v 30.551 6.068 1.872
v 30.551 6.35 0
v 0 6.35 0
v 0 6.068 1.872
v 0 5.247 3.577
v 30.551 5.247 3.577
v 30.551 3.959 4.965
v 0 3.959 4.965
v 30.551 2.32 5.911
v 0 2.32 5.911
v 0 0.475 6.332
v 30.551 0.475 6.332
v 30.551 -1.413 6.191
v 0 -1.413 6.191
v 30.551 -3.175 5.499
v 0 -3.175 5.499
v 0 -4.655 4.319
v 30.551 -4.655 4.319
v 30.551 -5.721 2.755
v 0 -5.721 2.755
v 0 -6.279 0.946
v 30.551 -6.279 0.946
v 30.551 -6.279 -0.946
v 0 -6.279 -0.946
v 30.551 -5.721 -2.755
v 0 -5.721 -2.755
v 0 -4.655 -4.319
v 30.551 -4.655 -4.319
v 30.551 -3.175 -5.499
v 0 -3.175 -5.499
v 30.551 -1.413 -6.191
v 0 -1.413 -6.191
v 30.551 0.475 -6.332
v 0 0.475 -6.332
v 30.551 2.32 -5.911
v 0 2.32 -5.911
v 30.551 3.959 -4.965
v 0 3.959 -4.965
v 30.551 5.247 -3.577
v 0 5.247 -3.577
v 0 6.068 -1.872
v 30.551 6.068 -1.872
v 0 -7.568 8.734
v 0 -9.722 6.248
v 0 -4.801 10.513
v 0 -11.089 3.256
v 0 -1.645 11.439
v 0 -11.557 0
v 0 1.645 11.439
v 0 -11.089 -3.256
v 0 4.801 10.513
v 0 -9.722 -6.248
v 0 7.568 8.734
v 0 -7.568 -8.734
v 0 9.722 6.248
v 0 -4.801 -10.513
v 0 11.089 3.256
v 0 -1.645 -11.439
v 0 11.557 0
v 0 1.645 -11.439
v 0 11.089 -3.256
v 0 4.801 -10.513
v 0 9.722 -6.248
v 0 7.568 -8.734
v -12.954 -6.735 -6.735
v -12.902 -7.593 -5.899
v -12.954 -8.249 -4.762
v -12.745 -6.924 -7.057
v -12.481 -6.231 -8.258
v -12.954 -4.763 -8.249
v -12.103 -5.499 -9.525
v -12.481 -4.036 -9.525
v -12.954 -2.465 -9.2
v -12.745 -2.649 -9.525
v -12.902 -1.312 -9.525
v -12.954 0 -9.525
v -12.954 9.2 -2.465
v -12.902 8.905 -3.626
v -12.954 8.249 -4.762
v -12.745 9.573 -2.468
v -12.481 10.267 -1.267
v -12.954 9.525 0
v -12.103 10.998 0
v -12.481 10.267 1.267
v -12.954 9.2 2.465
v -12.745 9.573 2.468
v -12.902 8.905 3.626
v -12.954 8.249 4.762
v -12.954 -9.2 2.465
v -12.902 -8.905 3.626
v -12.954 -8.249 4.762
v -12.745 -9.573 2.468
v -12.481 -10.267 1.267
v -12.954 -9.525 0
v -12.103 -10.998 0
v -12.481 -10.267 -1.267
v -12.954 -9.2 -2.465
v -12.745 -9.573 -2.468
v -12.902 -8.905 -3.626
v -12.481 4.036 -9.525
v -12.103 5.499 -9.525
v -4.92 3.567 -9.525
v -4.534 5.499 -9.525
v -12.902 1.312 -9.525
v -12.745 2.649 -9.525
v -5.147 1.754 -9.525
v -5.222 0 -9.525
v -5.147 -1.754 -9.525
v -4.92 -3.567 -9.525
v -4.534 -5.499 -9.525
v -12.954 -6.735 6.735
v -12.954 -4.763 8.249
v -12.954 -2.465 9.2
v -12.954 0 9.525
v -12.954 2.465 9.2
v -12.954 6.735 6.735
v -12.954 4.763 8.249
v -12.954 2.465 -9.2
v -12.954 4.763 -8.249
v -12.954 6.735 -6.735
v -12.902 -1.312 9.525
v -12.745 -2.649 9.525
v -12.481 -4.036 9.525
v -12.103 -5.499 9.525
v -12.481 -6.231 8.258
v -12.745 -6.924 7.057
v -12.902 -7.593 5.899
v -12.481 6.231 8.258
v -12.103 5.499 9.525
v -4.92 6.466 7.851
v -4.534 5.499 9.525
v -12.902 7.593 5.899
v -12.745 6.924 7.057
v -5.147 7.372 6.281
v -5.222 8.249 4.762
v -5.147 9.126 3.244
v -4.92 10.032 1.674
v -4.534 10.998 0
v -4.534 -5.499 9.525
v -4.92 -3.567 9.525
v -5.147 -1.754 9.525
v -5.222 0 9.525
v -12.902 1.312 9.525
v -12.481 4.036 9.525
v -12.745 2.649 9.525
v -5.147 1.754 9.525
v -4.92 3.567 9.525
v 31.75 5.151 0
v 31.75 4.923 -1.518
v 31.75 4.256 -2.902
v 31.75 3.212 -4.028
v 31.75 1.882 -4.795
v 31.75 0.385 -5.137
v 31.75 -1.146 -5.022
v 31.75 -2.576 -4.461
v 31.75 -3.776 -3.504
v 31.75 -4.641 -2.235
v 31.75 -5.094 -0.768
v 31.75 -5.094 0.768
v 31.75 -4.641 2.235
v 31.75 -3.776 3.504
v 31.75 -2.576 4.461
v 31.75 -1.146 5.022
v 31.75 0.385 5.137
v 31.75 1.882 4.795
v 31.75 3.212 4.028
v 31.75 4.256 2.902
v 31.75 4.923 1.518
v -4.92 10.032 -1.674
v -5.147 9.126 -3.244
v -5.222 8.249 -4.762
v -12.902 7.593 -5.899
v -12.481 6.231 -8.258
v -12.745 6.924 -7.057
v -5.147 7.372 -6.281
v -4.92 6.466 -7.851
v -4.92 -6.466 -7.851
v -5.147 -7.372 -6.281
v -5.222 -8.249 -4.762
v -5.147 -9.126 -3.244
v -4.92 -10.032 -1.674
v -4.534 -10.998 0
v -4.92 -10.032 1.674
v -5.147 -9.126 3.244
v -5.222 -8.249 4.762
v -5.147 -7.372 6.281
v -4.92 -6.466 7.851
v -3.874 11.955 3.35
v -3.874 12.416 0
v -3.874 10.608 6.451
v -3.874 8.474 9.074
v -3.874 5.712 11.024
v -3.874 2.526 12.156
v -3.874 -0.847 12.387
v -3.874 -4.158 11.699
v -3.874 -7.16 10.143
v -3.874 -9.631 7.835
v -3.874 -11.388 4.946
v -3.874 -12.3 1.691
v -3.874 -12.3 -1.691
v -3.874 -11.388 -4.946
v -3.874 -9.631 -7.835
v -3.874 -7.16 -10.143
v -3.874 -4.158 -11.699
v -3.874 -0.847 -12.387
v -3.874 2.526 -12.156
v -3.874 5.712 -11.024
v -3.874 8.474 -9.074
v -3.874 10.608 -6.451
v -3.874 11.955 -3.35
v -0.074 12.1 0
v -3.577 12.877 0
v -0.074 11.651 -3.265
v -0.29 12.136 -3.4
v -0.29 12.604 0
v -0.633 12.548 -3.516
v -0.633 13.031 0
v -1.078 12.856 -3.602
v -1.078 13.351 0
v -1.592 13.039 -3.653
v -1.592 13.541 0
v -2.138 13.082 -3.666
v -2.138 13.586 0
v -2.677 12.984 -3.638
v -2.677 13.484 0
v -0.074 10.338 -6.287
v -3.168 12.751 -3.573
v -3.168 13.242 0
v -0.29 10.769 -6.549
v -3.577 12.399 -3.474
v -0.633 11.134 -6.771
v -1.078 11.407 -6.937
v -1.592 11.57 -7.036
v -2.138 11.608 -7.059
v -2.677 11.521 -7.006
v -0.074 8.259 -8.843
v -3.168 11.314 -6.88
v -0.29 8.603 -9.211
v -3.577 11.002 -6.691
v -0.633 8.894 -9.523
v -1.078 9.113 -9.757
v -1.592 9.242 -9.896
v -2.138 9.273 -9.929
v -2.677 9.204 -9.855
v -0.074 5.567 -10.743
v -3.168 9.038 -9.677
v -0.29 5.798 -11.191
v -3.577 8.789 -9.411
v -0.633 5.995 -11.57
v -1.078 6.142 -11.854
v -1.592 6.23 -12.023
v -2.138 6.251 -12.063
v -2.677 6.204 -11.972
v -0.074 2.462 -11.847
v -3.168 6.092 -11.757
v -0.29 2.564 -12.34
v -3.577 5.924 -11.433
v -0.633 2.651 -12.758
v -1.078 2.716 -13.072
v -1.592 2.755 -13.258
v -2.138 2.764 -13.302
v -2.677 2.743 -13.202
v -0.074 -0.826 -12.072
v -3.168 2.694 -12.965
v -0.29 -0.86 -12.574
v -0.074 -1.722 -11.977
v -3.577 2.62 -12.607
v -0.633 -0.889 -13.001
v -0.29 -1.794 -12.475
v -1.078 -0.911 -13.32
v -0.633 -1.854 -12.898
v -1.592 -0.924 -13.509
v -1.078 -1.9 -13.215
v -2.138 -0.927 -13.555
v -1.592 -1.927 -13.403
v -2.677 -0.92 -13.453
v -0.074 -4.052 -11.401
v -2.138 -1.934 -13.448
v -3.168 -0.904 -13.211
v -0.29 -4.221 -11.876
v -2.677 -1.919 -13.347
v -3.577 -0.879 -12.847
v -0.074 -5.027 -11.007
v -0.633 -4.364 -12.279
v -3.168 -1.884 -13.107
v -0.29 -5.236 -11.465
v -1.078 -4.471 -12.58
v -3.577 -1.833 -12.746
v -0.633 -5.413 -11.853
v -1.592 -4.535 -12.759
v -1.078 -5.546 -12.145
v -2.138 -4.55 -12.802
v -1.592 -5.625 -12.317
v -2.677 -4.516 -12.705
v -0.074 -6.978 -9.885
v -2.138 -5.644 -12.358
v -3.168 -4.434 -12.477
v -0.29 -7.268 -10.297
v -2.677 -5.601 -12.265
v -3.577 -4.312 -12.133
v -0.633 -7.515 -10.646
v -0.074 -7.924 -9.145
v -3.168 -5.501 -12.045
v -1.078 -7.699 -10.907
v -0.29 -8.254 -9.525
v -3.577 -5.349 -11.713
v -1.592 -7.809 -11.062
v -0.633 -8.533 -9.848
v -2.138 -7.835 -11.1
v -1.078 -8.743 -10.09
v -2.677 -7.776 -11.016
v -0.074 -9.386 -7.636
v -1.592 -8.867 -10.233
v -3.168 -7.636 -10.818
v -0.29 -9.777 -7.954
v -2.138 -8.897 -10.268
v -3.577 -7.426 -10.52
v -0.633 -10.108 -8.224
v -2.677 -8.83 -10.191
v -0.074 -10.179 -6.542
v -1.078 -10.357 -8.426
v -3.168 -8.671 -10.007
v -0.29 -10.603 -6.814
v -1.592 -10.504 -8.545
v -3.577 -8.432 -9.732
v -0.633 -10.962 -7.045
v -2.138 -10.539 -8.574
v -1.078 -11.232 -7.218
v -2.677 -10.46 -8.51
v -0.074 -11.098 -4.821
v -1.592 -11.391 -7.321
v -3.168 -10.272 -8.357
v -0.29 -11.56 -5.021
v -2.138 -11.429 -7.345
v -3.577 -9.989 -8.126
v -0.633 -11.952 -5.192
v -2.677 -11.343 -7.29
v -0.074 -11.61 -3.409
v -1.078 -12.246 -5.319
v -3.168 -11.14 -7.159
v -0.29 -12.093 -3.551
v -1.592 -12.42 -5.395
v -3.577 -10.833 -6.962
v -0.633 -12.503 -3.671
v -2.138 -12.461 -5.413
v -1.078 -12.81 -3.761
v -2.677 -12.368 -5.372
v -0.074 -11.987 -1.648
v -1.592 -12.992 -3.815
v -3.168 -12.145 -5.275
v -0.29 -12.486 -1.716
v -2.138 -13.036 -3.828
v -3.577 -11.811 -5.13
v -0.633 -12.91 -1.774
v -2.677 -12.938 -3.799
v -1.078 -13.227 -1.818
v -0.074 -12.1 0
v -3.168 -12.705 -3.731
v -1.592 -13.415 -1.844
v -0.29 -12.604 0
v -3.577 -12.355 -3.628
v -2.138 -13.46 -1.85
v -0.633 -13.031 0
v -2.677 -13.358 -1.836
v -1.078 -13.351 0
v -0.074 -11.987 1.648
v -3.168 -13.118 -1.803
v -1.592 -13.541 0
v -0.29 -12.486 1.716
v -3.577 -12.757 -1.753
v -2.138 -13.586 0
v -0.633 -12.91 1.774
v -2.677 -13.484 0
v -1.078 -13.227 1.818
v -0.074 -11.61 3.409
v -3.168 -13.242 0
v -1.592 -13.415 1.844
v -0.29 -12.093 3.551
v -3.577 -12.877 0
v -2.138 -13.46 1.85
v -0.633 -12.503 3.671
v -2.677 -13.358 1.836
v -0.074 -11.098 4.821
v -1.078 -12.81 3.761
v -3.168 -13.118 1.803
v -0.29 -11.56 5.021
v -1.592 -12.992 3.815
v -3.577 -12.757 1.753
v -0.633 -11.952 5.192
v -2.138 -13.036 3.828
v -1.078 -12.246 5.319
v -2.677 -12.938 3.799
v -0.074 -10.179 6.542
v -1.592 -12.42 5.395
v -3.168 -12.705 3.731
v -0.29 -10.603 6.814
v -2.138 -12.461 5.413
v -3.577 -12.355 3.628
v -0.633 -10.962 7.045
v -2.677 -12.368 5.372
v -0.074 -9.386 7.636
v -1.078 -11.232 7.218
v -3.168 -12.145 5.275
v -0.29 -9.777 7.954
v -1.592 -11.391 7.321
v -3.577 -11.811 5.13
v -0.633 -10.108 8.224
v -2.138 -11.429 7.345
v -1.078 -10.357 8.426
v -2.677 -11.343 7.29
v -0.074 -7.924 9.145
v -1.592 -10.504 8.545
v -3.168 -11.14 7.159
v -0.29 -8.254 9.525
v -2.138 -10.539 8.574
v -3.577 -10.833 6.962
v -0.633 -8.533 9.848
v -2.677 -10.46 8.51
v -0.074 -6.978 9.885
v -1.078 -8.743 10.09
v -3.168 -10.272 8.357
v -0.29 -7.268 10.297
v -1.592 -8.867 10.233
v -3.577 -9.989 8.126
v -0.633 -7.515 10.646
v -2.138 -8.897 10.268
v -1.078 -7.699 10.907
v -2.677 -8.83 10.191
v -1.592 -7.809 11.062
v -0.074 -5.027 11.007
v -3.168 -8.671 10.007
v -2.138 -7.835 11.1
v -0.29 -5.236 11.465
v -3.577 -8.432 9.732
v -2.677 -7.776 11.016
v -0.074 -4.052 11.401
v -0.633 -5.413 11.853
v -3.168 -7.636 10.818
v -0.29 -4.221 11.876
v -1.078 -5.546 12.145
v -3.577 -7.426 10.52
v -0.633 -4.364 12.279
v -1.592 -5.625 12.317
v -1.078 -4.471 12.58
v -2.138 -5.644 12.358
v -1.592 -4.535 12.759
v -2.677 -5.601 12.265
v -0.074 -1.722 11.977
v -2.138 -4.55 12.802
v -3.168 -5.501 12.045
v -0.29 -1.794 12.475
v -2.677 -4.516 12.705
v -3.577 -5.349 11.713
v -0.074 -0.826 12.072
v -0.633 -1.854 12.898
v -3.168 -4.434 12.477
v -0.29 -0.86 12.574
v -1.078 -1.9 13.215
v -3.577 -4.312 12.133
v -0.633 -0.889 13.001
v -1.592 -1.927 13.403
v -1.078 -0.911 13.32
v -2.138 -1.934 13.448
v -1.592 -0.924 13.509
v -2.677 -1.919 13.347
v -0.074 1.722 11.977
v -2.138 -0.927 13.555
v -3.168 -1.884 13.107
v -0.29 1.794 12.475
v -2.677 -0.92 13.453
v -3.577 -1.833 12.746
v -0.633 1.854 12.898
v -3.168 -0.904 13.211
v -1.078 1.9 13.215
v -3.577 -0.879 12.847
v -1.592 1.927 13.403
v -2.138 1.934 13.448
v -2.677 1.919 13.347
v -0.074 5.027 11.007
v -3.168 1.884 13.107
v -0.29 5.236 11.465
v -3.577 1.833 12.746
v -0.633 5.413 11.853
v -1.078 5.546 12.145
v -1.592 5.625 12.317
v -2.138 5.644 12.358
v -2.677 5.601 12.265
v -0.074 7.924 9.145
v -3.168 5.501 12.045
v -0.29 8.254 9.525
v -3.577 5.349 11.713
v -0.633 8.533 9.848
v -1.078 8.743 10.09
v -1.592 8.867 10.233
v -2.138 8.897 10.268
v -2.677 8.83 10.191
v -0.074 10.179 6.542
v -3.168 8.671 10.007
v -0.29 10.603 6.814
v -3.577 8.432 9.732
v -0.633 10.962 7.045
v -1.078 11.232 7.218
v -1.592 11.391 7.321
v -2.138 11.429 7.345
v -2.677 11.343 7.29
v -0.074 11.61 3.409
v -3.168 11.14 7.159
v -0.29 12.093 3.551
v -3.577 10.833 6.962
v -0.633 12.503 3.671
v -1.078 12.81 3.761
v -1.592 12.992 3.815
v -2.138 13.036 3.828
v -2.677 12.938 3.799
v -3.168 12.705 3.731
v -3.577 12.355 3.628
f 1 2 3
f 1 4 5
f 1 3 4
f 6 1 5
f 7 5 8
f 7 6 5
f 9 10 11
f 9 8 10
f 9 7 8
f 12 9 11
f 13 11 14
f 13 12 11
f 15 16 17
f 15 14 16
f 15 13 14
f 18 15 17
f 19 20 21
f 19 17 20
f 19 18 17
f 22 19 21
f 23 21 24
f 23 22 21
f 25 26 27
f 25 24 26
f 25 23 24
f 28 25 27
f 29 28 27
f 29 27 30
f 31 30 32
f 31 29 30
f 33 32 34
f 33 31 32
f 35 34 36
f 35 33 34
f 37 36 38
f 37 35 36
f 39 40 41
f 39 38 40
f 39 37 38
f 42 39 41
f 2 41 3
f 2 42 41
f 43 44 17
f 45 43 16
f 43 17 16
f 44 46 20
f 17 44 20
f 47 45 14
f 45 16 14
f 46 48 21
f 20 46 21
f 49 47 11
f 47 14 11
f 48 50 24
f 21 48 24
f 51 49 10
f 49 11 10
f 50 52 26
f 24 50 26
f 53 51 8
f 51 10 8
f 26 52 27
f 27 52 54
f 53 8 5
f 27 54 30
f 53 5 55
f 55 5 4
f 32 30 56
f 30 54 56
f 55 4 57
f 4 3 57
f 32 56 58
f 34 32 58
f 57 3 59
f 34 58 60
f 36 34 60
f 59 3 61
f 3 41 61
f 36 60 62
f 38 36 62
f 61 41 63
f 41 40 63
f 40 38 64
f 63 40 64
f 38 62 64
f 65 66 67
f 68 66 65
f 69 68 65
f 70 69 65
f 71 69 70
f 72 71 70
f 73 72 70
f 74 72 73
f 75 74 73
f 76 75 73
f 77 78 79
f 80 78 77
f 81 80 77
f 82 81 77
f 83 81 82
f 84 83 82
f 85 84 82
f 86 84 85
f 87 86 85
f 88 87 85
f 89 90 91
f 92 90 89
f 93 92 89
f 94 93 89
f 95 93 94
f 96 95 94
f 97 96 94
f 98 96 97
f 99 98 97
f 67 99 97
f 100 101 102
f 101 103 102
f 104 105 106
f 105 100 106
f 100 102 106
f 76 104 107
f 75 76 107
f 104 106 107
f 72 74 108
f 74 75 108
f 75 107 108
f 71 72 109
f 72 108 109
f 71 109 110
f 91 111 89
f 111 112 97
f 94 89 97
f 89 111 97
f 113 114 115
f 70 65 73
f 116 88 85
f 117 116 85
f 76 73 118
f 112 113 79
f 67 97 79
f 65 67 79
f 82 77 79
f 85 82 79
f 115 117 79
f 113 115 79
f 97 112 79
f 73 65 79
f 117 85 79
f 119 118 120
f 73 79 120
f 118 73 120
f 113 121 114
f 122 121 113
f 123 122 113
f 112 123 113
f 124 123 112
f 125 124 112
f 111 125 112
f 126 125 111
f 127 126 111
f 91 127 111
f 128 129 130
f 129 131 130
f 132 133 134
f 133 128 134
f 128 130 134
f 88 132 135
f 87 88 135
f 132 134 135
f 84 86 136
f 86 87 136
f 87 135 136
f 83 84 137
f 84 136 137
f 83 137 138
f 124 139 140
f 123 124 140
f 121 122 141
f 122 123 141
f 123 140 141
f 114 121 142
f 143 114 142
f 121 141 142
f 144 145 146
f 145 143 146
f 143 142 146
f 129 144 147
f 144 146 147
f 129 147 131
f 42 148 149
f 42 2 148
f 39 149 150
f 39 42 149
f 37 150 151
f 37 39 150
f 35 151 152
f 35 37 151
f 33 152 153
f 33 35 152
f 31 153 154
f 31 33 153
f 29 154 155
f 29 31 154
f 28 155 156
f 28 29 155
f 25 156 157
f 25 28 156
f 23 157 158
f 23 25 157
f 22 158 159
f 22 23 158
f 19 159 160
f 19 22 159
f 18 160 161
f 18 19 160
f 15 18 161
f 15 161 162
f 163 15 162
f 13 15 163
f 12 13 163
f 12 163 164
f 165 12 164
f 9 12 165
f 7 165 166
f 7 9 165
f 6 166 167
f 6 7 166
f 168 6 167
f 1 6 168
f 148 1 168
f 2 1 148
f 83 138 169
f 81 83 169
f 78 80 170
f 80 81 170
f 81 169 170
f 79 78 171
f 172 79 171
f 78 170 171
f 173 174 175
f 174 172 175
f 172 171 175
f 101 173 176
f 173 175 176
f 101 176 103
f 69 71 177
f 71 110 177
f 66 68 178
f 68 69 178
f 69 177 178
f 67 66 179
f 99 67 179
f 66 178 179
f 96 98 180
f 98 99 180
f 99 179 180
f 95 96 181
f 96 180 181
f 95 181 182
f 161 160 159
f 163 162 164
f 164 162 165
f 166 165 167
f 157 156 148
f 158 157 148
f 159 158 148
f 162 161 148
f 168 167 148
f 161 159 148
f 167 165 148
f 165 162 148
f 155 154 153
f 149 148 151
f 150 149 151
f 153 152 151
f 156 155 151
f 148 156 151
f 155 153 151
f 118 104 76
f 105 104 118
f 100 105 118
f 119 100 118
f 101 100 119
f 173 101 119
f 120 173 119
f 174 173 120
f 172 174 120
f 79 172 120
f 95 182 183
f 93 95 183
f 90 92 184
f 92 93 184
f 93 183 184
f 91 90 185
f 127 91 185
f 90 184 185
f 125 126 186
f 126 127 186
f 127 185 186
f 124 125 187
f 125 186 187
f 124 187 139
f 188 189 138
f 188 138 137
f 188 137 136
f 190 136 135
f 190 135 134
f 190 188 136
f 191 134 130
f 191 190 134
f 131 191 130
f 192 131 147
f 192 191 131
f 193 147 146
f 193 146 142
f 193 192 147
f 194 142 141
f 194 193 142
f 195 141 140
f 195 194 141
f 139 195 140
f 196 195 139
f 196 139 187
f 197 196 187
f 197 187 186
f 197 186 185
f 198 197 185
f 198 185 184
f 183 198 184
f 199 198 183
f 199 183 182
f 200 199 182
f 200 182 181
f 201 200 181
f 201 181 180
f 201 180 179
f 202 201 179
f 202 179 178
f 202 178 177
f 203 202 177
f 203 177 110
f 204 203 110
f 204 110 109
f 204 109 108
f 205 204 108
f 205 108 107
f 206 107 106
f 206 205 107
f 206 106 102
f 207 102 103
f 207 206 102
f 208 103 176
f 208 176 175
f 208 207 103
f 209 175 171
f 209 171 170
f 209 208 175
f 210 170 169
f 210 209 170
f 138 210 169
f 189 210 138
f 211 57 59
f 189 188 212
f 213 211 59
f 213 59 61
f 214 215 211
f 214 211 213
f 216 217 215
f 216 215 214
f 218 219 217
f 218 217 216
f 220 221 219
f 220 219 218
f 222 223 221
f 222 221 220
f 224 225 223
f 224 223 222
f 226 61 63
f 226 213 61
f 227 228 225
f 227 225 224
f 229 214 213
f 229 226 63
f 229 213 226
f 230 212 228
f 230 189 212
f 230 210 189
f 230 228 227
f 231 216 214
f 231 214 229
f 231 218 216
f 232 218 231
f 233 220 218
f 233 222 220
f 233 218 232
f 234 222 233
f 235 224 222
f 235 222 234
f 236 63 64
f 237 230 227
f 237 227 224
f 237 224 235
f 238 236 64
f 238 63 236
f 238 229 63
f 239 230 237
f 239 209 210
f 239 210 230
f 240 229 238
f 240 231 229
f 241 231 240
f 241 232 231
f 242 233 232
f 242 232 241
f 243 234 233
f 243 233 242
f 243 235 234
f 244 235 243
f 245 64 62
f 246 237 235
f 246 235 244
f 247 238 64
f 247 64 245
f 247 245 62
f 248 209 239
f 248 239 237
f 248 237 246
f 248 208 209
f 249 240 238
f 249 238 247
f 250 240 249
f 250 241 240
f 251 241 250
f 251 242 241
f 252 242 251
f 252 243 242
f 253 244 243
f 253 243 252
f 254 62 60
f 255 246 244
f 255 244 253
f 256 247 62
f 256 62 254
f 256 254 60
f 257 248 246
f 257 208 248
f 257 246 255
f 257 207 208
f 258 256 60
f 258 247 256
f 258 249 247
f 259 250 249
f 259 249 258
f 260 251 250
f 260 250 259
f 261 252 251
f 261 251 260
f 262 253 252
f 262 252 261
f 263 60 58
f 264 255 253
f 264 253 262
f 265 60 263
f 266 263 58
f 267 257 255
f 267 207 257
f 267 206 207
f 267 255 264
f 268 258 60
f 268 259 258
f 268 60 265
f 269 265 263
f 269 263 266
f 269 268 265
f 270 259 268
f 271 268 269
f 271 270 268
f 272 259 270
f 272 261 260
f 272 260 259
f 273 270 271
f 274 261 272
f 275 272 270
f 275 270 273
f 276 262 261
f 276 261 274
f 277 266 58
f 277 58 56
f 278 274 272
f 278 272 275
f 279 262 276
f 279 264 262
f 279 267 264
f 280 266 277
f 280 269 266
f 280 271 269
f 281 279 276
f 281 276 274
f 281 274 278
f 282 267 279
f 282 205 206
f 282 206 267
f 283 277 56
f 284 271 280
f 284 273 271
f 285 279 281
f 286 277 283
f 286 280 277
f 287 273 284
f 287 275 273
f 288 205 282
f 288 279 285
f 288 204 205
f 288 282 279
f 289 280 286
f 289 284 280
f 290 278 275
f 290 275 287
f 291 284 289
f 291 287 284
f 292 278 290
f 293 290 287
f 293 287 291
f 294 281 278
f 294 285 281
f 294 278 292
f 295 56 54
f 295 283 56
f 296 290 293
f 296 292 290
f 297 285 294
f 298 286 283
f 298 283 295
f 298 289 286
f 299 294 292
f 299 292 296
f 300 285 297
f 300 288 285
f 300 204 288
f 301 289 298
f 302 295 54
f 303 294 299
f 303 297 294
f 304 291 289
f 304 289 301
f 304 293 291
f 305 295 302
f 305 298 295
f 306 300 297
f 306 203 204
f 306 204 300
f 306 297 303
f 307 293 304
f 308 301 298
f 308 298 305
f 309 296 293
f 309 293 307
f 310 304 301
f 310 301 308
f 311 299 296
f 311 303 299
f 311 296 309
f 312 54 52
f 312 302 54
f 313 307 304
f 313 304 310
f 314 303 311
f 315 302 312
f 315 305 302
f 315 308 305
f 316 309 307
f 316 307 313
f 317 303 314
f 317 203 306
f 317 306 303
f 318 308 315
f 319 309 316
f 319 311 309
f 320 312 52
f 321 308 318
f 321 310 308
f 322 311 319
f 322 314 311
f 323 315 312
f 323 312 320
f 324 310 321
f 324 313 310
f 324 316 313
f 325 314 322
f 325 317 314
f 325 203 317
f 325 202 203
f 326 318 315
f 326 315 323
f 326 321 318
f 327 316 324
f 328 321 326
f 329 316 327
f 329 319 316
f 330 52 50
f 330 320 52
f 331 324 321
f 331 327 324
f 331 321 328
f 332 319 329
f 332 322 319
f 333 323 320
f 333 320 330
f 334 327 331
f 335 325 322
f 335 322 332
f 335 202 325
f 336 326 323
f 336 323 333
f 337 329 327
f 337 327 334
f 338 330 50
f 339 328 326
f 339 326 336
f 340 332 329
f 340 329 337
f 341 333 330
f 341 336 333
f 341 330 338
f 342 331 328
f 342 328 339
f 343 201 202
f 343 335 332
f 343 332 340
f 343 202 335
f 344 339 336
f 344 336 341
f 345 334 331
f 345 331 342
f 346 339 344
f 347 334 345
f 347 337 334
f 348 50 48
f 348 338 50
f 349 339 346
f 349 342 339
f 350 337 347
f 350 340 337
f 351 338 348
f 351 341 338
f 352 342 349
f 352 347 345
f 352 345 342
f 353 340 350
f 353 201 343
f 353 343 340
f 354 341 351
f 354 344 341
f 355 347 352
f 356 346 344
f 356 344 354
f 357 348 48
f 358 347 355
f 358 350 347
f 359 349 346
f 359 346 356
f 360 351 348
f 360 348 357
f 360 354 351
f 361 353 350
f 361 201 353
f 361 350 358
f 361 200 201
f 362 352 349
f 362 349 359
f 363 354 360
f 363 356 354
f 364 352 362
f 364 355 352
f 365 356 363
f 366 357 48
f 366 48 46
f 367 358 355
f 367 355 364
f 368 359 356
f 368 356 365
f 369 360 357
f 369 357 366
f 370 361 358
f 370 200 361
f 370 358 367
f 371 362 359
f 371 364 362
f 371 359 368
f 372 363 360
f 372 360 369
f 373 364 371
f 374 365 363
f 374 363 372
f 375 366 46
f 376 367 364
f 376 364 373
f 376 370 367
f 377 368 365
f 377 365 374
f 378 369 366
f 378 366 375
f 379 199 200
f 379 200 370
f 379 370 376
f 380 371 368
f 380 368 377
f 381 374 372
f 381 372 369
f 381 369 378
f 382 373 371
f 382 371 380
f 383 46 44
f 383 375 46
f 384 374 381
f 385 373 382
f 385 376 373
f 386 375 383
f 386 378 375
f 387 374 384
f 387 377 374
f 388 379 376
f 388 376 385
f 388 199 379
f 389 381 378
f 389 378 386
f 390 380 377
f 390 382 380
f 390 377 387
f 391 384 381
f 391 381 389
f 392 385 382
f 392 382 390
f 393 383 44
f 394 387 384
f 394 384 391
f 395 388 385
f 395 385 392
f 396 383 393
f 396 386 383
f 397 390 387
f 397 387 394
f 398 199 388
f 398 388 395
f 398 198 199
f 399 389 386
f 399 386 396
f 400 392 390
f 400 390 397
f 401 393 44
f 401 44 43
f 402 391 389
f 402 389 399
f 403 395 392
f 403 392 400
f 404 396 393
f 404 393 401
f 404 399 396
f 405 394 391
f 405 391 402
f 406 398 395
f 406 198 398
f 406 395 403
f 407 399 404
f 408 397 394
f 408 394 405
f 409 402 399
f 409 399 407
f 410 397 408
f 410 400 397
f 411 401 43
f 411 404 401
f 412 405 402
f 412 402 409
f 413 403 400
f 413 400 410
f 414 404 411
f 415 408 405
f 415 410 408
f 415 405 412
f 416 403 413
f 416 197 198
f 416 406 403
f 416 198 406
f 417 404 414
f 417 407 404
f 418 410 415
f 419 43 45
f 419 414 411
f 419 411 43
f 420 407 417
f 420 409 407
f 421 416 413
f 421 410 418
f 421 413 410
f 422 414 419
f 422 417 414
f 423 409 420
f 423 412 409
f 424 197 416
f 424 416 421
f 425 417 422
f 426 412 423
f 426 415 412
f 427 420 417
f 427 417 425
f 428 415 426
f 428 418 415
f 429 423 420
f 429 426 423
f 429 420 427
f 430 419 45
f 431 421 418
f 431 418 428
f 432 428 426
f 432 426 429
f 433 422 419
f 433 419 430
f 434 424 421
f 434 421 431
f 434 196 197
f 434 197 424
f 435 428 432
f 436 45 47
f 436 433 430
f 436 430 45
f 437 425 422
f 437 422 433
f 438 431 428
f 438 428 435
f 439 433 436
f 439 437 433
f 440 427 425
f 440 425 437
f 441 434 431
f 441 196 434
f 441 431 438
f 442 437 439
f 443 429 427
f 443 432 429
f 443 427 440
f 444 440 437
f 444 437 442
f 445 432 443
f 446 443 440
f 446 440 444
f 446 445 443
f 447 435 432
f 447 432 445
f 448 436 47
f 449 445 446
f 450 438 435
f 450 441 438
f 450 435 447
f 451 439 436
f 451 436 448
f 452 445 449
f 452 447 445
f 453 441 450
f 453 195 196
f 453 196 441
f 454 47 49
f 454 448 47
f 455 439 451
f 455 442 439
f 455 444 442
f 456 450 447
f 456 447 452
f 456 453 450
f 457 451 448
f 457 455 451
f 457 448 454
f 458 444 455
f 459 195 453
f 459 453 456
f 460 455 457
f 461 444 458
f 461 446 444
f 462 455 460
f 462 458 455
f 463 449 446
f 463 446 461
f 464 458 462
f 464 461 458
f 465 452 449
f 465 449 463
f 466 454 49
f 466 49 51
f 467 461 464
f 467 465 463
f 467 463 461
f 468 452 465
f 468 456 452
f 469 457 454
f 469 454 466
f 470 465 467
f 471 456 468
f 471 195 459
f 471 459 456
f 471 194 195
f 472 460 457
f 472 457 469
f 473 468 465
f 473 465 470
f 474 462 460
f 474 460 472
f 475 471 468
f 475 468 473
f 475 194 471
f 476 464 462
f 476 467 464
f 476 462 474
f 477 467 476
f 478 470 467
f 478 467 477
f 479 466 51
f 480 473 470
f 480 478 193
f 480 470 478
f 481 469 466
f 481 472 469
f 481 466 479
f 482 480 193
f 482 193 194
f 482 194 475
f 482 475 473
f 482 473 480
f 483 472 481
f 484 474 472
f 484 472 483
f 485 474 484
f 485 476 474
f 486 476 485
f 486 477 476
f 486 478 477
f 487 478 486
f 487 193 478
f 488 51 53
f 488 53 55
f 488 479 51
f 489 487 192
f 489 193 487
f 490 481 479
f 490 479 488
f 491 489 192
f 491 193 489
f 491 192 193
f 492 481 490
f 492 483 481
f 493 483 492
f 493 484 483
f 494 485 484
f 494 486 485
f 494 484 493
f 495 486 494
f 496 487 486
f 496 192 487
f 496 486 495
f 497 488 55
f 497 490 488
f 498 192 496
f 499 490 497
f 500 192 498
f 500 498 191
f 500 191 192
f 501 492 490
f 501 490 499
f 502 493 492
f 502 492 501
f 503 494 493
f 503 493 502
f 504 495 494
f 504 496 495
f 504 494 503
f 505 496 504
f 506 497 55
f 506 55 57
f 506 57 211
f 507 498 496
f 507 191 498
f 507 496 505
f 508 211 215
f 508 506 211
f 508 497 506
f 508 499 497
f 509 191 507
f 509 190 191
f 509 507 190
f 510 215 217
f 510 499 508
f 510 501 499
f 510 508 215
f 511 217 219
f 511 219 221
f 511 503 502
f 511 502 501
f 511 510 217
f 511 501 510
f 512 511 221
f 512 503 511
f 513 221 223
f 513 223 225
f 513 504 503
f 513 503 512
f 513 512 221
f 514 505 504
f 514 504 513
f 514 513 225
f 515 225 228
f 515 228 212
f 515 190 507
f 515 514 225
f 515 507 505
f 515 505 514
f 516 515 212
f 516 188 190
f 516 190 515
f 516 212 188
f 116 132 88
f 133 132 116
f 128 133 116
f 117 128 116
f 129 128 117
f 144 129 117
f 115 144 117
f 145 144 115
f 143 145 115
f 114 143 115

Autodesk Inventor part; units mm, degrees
ref_plane "YZ Plane" through (0, 0, 0) normal (1, 0, 0) x (0, 1, 0)
ref_plane "XZ Plane" through (0, 0, 0) normal (0, 1, 0) x (-1, 0, 0)
sketch "Sketch1" plane through (0, 0, 0) normal (0, 0, 1) x (1, 0, 0)
  line L0 (-5.8293, 0) -> (-5.8293, 8.2218)
  line L1 (0, 11.557) -> (0, 6.35)
  line L2 (5.1308, 6.35) -> (31.75, 6.35)
  line L3 (31.75, 6.35) -> (31.75, 0)
  line L4 (31.75, 0) -> (-5.8293, 0)
  arc A0 (0, 11.557) -> (-3.8736, 12.4158) centre (-2.032, 11.557) ccw
  line L5 (0, -2.794) -> (0, 16.7643) projected
  line L6 (-13.3452, 0) -> (39.2659, 0) projected
  line L7 (0, 6.35) -> (0.0001, 6.35)
  line L8 (0.0001, 6.35) -> (0.0001, 6.35)
  line L9 (0.0001, 6.35) -> (2.2098, 6.35)
  line L10 (2.2098, 6.35) -> (5.1308, 6.35)
  line L11 (-5.8293, 8.2218) -> (-3.8736, 12.4158)
  line L12 (0.0001, 6.35) -> (5.1308, 6.35) construction
  line L13 (5.1308, 6.35) -> (5.1308, 0) construction
  dimension "d0" = 2.032
  dimension "d1" = 31.75
  dimension "d2" = 26.6192
  dimension "d3" = 27.178
  dimension "d4" = 12.7
  dimension "d5" = 5.8293
  dimension "d15" = 12.7
  dimension "d16" = 12.7
  dimension "d17" = 0.0001
  dimension "d18" = 2.921
  dimension "d19" = 25
revolve "Body" add sketch "Sketch1" angle 360 about axis through (31.75, 0, 0) along (-1, 0, 0)
sketch "Sketch2" plane through (0, 0, 0) normal (1, 0, 0) x (0, 0, -1)
  line L0 (9.525, 5.4993) -> (9.525, -5.4993)
  line L1 (9.525, -5.4993) -> (0, -10.9985)
  line L2 (0, -10.9985) -> (-9.525, -5.4993)
  line L3 (-9.525, -5.4993) -> (-9.525, 5.4993)
  line L4 (-9.525, 5.4993) -> (0, 10.9985)
  line L5 (0, 10.9985) -> (9.525, 5.4993)
  point P0 (0, 0)
  point P1 (0, 0)
  dimension "d23" = 19.05
extrude "Head" add sketch "Sketch2" against normal blind 12.954
sketch "Sketch3" plane through (0, 0, 0) normal (0, 0, 1) x (1, 0, 0)
  line L0 (-12.954, 9.525) -> (-12.954, 10.9985)
  line L1 (-12.954, 10.9985) -> (-12.1033, 10.9985)
  line L2 (-12.1033, 10.9985) -> (-12.954, 9.525)
  line L3 (-14.6379, 0) -> (-2.8506, 0) projected
  line L4 (-12.954, 10.9985) -> (-12.954, 5.4993) projected
  line L5 (-4.5345, 10.9985) -> (-12.954, 10.9985) projected
  point P0 (-12.954, 5.4993)
  dimension "d8" = 30
  dimension "d22" = 19.05
revolve "Chamfer1" cut sketch "Sketch3" angle 360 about axis through (-10, 0, 0) along (1, 0, 0)
thread "Thread" size "1/2-13 UNC" class "2A" standard "ANSI Unified Screw Threads" length 26.6192
chamfer "Chamfer2" distance 1.1986 distance2 1.1986 1 edges at (31.75, -6.35, 0) measured on face at (31.75, 0.2551, 2.1012)
ref_plane "Work Plane1" through (10.95, 0, 0) normal (0, 0, -1) x (1, 0, 0)
equation "\"d0\" = PHH"
equation "\"d1\" = NLG"
equation "\"d2\" = GEL"
equation "\"d3\" = LADI"
equation "\"d4\" = GD"
equation "\"d5\" = 0.45 * KOH"
equation "\"d15\" = SD2"
equation "\"d16\" = BDM"
equation "\"d18\" = GAL"
equation "\"d19\" = KEWI"
equation "\"d23\" = SW"
equation "\"d6\" = KOH"
equation "\"d8\" = ANG1"
equation "\"d22\" = SW0"
equation "\"d10\" = GEL"
equation "\"d13\" = -0.5 * SPD + 0.5 * GD"
equation "\"d14\" = GUL"
equation "\"NLG\" = 31.75"
equation "\"GD\" = NND"
equation "\"BDM\" = NND"
equation "\"KOH\" = 12.954"
equation "\"GEL\" = 26.6192"
equation "\"LADI\" = 27.178"
equation "\"SW\" = 19.05"
equation "\"PHH\" = 2.032"
equation "\"SW0\" = SW"
equation "\"SPD\" = 10.30283"
equation "\"SD2\" = NND"
equation "\"SD\" = 0"
equation "\"ANG1\" = 30deg"
equation "\"KEWI\" = 25deg"
equation "\"GAL\" = 2.921"
equation "\"GUL\" = 1.19859"
equation "\"THREADDIA\" = 12.7"
equation "\"SDH\" = SW"
equation "\"TOA\" = 30deg"
equation "\"NND\" = 12.7"
equation "\"E0\" = 1.155 * SW"
equation "\"GD1\" = 10.30283"
properties part number "IFI 111 - 1/2-13 UNC x 1,25" material "Steel, Mild"
